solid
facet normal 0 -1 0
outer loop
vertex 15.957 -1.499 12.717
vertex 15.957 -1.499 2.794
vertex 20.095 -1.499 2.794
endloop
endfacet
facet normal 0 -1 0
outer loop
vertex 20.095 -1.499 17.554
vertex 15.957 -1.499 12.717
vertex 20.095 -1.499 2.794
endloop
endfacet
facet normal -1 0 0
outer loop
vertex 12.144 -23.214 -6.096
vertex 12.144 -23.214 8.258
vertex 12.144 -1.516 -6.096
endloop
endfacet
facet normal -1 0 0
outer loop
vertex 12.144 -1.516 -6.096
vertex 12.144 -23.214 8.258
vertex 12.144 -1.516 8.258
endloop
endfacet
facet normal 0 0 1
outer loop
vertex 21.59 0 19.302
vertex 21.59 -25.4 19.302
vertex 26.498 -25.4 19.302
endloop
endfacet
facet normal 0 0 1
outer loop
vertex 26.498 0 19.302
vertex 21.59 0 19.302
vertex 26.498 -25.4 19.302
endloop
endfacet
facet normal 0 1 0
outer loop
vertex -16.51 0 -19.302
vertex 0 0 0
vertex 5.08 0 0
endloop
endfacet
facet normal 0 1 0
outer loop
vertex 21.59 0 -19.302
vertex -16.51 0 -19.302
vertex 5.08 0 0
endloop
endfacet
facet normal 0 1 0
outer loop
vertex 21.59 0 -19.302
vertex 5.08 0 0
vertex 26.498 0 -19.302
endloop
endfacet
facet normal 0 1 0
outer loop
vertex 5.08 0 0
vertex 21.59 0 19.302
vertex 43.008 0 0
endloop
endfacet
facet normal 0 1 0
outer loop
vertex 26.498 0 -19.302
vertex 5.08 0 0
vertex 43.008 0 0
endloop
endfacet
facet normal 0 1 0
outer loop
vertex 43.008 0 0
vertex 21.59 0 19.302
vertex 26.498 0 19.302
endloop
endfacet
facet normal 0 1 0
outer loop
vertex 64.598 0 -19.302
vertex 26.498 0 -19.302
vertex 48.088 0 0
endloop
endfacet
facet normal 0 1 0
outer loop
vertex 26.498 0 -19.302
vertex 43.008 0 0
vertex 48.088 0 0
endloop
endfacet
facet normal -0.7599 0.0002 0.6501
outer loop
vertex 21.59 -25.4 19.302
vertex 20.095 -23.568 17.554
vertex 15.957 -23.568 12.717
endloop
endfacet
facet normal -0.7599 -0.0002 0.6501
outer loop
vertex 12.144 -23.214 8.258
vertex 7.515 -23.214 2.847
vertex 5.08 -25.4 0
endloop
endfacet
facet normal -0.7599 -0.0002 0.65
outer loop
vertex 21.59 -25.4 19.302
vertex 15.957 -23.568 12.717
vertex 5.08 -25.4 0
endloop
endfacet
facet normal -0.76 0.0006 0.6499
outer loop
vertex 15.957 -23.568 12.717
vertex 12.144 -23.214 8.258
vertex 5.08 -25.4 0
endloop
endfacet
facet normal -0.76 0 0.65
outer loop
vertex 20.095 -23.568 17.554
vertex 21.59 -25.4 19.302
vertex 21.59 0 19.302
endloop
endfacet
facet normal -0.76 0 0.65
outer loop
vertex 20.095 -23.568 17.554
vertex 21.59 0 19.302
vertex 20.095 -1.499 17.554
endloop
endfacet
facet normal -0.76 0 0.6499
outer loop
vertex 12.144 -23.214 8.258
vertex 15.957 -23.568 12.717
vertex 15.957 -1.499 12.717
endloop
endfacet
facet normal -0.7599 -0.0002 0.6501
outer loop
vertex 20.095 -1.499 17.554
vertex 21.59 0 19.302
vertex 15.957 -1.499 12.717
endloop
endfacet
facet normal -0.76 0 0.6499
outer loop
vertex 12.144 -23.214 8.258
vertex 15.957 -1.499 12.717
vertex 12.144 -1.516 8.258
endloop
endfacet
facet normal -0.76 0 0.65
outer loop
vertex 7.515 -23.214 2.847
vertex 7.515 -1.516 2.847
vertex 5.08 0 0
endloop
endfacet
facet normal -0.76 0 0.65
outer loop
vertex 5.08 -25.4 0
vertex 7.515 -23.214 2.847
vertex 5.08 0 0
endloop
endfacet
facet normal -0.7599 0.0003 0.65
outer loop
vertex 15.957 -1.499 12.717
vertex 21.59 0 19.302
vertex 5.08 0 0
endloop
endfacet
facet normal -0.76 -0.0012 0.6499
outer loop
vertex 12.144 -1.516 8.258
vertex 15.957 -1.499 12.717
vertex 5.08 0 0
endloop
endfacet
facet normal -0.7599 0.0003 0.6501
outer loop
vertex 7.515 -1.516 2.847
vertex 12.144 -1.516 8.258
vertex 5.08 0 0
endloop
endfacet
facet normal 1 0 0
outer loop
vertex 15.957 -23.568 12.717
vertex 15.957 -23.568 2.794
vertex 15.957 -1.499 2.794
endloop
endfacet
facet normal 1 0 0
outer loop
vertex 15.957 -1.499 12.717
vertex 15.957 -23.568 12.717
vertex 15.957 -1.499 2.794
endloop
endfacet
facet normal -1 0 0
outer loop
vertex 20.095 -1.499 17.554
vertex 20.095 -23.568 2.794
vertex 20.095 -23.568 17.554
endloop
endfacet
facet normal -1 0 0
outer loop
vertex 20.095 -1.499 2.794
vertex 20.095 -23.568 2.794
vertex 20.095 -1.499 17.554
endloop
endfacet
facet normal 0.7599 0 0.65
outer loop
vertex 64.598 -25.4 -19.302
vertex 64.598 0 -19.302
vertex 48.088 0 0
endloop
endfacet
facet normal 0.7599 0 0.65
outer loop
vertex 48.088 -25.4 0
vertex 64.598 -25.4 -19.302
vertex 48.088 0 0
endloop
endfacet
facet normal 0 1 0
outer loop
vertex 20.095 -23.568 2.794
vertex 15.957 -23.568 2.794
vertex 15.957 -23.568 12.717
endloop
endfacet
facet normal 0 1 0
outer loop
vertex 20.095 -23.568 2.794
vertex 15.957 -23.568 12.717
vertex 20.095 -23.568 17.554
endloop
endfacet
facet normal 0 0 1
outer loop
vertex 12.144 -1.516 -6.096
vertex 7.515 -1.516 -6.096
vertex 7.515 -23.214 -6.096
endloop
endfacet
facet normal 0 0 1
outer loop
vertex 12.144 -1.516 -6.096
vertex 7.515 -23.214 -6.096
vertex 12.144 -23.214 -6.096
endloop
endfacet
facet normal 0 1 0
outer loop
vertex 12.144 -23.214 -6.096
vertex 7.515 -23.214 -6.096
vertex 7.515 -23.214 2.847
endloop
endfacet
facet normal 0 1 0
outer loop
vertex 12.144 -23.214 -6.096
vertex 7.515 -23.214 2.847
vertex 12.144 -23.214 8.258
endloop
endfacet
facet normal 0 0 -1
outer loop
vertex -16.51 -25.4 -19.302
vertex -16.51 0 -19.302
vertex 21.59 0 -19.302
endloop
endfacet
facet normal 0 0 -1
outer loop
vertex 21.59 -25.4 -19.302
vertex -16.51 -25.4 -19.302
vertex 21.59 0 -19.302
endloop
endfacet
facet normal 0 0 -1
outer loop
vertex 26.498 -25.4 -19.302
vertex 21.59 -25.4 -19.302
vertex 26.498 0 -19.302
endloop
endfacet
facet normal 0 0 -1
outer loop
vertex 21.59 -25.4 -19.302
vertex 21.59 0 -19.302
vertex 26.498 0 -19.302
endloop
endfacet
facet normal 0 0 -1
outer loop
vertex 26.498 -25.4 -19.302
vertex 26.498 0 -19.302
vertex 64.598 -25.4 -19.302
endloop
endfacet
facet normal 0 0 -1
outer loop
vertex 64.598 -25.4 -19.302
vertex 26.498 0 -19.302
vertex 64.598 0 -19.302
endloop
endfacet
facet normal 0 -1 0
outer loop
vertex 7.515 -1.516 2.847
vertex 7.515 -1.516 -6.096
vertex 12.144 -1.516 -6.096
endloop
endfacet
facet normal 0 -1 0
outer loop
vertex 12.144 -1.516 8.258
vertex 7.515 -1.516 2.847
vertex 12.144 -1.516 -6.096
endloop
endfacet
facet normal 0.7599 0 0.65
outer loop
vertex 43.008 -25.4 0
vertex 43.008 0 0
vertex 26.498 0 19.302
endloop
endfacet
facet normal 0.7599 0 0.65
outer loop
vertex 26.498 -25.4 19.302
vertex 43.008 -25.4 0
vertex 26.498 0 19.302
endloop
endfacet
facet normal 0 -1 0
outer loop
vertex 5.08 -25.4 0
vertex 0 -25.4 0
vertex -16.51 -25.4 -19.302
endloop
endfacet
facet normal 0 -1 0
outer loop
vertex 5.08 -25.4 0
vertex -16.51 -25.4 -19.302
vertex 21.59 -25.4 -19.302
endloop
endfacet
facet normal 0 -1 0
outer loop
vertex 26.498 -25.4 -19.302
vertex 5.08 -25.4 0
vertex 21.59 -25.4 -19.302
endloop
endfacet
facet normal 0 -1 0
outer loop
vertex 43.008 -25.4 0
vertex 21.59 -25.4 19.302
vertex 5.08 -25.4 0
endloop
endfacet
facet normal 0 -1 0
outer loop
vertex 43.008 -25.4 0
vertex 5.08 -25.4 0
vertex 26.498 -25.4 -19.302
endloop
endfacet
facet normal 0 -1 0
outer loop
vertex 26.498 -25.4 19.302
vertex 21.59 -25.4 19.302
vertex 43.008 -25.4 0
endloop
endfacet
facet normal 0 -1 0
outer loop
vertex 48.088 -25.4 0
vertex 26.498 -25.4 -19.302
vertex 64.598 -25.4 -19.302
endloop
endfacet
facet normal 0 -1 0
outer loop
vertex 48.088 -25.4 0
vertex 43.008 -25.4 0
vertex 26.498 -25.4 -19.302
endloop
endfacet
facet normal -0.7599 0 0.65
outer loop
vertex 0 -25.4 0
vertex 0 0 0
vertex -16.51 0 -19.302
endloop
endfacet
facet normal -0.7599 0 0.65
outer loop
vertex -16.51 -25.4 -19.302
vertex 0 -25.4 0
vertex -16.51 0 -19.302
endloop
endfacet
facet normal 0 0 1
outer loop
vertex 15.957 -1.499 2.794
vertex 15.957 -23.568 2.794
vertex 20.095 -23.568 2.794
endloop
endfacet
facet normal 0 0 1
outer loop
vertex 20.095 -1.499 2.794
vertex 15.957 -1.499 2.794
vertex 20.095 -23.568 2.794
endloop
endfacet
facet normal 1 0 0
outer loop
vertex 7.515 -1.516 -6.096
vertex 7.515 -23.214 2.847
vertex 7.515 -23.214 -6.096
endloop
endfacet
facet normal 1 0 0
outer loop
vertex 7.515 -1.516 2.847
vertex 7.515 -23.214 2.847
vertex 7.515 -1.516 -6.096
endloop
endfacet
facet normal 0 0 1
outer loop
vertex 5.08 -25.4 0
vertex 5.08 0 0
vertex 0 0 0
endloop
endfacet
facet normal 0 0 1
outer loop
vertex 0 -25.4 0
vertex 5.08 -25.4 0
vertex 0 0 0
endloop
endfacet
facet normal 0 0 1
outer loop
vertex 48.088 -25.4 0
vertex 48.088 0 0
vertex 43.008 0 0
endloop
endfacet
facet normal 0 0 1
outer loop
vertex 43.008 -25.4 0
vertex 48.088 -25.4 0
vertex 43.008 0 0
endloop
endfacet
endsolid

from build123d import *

# Parameters (mm, degrees)
F0_W          = 4.9083643031
F0_H          = 38.6046577501
F1_DEPTH      = 25.4
F3_W          = 4.1379593313
F3_H          = 22.0691054128
F4_DEPTH      = 8.89
F4_DEPTH_BACK = 25.4
F5_W          = 4.6289921738
F5_H          = 21.6983995633
F6_DEPTH      = 17.78


with BuildPart() as f1:
    # F0 (on Front) → F1 (new body)
    with BuildSketch(Plane.XZ):
        Polygon((5.08, 0), (0, 0), (-16.51, -19.302328875), (21.59, -19.302328875), (21.59, 19.302328875), align=None)
        with Locations((24.0441821516, 0)):
            Rectangle(F0_W, F0_H)
        Polygon((26.4983643031, 19.302328875), (26.4983643031, -19.302328875), (64.5983643031, -19.302328875), (48.0883643031, 0), (43.0083643031, 0), align=None)
    extrude(amount=F1_DEPTH)

    # F3 (on offset) → F4 (cut, two sides)
    with BuildSketch(Plane.XY.offset(11.684)) as f4_sk:
        with Locations((18.0260073394, -12.533511268)):
            Rectangle(F3_W, F3_H)
    extrude(amount=-F4_DEPTH, mode=Mode.SUBTRACT)
    extrude(f4_sk.sketch, amount=F4_DEPTH_BACK, mode=Mode.SUBTRACT)

    # F5 (on offset) → F6 (cut)
    with BuildSketch(Plane.XY.offset(11.684)):
        with Locations((9.8292285111, -12.3650435708)):
            Rectangle(F5_W, F5_H)
    extrude(amount=-F6_DEPTH, mode=Mode.SUBTRACT)


solid = f1.part
